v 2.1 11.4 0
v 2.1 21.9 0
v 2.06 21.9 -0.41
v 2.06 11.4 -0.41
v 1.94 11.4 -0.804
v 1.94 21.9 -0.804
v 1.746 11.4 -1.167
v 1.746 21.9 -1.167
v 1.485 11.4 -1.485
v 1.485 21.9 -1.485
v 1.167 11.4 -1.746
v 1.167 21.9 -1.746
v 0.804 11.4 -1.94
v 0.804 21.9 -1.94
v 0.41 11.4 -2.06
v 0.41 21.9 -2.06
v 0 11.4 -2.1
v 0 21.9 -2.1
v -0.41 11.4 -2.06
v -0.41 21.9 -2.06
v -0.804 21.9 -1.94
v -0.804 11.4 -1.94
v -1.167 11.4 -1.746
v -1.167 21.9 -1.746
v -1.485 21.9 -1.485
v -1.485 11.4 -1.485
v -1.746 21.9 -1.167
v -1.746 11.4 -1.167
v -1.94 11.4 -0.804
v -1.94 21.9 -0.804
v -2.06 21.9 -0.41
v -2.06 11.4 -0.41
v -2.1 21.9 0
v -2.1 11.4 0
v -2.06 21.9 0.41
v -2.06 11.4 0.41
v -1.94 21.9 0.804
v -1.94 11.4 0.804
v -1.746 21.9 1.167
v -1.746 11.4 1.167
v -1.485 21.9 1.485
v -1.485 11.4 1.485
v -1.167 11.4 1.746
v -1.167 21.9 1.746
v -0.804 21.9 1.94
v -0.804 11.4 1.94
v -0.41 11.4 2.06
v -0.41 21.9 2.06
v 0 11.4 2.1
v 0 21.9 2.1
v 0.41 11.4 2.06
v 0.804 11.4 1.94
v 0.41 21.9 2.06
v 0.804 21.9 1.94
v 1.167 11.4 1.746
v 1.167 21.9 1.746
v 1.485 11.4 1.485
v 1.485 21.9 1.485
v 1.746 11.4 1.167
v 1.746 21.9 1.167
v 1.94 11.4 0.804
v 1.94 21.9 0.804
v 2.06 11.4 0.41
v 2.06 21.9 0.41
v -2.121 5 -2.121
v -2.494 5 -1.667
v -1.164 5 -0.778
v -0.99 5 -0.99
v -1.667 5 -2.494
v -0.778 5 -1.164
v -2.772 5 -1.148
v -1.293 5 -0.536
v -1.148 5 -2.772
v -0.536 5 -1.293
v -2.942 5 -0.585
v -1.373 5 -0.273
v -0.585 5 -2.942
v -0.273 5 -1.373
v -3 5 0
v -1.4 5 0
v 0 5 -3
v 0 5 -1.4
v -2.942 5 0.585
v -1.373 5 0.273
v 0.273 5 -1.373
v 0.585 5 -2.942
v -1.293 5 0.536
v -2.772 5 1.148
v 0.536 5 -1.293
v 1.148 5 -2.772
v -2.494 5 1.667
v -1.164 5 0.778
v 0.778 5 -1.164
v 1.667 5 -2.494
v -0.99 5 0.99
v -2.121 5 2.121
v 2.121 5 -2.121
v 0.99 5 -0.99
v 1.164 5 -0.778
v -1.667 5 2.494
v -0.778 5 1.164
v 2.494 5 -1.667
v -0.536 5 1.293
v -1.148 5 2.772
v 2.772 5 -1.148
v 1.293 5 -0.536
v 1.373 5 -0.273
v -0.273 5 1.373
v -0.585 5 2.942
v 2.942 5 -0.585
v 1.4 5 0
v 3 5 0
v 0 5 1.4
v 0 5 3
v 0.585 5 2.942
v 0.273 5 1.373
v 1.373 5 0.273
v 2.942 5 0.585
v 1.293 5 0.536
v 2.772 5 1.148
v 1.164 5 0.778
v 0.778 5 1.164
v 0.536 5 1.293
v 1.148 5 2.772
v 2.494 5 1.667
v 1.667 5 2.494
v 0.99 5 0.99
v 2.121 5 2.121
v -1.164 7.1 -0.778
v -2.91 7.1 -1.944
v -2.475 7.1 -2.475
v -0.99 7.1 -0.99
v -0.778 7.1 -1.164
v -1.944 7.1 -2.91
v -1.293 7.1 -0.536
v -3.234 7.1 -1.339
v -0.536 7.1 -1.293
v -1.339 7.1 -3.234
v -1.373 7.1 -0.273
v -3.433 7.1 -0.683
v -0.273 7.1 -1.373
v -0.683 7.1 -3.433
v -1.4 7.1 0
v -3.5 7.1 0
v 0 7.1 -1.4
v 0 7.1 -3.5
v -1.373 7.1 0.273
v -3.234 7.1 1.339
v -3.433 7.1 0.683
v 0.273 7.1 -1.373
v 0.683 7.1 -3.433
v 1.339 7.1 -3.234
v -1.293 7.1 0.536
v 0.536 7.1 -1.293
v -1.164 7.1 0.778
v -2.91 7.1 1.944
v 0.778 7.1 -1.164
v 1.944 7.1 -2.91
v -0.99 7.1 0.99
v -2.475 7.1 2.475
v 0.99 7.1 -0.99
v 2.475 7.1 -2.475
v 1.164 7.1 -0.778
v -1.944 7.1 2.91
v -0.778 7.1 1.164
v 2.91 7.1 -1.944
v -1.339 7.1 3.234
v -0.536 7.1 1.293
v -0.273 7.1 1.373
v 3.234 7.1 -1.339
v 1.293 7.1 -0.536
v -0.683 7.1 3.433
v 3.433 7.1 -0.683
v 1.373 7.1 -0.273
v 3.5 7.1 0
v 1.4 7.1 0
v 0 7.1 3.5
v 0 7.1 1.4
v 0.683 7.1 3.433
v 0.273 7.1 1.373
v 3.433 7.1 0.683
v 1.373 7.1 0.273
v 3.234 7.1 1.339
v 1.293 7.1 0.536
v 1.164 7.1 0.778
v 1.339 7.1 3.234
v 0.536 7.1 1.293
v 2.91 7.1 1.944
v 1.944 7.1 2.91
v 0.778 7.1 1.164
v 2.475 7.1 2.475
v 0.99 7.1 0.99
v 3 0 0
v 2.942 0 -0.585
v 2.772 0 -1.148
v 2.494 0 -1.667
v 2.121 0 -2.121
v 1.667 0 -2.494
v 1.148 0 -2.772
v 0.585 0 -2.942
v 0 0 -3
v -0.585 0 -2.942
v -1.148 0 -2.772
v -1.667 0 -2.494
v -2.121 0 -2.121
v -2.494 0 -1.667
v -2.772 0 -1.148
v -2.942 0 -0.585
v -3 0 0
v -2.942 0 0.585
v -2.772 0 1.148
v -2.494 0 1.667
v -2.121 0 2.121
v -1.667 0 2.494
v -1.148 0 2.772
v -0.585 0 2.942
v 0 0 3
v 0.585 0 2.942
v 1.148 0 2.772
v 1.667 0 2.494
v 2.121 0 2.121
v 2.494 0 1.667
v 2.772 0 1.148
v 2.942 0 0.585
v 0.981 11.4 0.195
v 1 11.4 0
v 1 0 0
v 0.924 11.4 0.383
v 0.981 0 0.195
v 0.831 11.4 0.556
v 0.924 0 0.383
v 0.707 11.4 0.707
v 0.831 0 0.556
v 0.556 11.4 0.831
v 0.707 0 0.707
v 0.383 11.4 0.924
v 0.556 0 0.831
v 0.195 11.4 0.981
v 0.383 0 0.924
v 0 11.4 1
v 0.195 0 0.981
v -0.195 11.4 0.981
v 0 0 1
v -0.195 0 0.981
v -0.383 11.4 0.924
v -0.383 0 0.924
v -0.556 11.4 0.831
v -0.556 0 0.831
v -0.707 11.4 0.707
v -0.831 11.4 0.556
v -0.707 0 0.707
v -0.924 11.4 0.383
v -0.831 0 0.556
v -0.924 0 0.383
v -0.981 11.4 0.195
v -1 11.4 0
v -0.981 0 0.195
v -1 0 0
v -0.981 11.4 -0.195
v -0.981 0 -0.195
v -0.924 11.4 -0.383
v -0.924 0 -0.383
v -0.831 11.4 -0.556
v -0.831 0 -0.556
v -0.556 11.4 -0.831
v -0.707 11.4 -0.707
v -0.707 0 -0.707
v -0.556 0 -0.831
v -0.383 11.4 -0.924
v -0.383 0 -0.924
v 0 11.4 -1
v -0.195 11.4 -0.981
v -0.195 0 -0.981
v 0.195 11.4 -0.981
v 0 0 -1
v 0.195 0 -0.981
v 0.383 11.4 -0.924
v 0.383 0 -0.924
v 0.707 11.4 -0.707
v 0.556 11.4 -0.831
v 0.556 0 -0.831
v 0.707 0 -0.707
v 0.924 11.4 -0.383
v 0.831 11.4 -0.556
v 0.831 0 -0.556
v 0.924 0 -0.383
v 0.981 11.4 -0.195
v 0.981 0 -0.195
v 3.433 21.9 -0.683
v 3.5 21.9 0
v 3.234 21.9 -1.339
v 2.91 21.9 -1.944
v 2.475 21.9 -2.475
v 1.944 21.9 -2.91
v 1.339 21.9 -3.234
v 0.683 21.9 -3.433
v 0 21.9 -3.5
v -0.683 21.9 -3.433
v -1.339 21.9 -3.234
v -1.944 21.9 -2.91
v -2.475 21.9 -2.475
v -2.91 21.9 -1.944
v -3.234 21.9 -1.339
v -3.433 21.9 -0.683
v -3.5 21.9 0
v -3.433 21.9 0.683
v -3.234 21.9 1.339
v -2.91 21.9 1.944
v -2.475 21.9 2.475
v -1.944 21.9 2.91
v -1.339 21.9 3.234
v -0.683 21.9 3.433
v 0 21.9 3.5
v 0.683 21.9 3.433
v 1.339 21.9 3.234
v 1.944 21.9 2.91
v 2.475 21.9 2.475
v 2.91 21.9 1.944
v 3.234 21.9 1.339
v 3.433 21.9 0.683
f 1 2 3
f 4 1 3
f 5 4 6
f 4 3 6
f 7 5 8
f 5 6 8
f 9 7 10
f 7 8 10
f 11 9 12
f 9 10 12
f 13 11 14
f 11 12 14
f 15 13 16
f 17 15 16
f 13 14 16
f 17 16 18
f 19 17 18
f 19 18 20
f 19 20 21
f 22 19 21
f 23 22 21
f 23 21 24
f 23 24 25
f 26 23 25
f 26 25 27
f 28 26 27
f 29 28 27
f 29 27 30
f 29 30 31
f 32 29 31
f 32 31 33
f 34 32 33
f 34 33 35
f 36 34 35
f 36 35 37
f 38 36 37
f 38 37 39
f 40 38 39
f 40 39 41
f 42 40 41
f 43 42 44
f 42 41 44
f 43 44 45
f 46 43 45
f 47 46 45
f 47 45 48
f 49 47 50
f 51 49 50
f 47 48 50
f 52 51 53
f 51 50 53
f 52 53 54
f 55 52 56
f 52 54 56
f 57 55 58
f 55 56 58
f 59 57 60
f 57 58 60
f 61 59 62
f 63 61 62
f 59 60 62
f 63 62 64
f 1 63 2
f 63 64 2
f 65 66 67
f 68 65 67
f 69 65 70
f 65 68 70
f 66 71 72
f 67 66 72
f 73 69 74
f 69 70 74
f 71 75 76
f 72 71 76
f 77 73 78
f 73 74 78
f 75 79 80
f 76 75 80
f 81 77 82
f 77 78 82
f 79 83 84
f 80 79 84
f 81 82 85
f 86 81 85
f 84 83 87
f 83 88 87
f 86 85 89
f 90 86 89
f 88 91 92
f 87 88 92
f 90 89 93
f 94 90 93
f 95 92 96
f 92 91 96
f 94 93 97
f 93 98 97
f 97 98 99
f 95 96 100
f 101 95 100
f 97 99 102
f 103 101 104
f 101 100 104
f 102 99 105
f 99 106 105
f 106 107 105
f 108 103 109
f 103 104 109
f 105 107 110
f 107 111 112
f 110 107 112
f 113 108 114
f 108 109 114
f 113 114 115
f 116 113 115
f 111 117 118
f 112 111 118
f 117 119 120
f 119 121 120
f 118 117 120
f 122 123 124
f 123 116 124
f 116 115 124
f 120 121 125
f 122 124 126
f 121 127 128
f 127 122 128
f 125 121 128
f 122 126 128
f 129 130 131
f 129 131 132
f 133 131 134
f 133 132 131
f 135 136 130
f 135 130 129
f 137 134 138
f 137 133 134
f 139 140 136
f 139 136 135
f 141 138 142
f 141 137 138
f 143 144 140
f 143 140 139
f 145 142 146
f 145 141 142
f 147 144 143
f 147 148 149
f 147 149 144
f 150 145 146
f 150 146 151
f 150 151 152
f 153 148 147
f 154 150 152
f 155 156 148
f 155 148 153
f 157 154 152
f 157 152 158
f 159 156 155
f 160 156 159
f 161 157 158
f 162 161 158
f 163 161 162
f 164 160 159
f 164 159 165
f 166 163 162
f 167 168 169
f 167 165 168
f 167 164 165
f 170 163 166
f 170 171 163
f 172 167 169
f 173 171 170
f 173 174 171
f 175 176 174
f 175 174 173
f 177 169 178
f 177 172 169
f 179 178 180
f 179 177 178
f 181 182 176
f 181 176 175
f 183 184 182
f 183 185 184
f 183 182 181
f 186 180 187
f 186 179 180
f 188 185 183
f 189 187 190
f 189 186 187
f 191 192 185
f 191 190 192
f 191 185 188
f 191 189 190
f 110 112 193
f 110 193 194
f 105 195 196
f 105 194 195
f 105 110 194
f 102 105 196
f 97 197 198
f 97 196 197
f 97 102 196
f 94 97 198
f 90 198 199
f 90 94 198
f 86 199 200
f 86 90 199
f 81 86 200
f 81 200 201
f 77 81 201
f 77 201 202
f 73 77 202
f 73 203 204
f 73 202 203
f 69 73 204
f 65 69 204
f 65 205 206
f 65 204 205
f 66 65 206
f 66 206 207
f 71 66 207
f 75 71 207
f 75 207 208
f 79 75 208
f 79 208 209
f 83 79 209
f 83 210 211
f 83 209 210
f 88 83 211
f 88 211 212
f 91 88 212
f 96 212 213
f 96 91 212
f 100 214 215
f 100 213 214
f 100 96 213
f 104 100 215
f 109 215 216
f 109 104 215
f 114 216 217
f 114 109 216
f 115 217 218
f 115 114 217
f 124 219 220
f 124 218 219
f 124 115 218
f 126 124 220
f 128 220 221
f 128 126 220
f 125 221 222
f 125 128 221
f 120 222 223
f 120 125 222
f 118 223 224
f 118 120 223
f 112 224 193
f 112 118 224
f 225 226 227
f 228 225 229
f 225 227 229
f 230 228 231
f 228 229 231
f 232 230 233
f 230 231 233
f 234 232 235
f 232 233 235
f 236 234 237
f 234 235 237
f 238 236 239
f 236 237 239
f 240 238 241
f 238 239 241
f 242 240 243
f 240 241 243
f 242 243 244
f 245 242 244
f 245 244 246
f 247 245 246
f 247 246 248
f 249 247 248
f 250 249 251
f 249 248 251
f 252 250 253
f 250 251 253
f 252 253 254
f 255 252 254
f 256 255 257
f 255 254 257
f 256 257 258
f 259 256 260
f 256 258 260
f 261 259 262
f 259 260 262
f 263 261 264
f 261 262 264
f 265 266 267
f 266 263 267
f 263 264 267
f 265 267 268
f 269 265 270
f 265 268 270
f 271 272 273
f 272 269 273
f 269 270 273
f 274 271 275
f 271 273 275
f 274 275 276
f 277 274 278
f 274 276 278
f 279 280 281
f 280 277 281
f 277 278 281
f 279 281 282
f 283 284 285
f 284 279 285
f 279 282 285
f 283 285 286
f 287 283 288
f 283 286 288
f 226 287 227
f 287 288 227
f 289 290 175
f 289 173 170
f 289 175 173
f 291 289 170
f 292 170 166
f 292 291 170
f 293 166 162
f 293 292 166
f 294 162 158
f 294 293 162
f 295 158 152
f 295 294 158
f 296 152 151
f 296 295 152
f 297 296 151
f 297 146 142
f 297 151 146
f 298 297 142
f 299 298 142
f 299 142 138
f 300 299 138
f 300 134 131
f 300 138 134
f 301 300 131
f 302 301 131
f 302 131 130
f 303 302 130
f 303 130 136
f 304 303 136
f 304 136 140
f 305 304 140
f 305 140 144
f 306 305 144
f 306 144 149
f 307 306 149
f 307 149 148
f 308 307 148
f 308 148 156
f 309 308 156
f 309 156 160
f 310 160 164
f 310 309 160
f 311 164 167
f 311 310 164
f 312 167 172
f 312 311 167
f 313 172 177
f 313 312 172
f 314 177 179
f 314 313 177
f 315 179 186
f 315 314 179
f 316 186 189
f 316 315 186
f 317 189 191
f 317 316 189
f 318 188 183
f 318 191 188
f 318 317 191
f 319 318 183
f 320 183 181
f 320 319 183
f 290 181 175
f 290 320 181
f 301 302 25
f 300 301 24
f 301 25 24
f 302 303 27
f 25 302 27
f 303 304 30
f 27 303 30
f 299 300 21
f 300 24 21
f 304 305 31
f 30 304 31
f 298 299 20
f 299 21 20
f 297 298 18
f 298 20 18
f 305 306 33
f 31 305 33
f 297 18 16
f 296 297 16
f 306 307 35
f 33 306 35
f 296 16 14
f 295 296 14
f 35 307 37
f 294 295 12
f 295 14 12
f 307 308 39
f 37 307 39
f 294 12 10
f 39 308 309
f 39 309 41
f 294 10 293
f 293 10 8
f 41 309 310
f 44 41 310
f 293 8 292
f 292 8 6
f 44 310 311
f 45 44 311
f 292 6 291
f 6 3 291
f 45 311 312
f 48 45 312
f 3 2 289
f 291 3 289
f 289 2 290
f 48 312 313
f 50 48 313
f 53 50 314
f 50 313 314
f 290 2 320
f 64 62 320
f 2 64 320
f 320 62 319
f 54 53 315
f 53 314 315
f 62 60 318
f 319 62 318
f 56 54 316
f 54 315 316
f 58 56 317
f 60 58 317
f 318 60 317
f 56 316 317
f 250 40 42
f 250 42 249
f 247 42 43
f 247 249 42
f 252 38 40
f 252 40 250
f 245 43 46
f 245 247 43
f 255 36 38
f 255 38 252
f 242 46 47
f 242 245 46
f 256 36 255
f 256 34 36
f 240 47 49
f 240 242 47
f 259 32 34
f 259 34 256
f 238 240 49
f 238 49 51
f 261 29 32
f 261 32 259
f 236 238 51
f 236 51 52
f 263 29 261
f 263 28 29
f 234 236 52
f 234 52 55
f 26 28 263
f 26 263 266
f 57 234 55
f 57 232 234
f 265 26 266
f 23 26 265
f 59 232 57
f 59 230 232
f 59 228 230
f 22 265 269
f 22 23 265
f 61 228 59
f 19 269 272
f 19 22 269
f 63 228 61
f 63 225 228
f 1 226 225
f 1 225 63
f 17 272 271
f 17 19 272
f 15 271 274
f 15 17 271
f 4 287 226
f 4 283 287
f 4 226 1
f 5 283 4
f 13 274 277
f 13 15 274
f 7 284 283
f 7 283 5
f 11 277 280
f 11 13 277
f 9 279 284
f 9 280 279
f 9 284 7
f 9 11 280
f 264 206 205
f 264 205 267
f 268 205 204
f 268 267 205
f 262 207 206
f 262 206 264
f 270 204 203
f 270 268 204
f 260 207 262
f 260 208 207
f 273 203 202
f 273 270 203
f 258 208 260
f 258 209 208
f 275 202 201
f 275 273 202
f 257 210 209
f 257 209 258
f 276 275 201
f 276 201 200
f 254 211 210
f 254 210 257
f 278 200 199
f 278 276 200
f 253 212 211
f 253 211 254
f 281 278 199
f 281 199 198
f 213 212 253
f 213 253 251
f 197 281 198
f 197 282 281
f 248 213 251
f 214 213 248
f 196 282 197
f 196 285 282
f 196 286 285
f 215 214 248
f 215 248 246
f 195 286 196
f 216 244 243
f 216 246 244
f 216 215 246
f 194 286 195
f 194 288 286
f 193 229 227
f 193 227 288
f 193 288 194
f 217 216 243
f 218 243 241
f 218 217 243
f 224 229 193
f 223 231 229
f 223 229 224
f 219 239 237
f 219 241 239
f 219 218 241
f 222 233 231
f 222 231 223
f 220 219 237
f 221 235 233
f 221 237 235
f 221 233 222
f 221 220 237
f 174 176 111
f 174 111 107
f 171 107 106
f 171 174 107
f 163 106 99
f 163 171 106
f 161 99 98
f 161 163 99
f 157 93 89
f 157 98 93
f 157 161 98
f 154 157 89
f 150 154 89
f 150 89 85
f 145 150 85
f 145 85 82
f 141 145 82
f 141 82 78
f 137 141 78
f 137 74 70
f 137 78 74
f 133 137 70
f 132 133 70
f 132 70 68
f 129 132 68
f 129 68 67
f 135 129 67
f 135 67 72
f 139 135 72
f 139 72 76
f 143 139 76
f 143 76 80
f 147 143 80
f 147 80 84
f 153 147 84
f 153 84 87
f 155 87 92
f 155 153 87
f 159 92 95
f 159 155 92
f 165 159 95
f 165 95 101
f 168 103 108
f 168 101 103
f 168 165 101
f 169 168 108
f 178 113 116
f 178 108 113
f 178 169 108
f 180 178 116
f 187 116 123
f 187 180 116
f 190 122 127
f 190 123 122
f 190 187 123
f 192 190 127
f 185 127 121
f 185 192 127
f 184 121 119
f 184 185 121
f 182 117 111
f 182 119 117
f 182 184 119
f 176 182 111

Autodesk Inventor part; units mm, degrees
ref_plane "YZ Plane" through (0, 0, 0) normal (1, 0, 0) x (0, 1, 0)
ref_plane "XZ Plane" through (0, 0, 0) normal (0, 1, 0) x (-1, 0, 0)
ref_plane "XY Plane" through (0, 0, 0) normal (0, 0, 1) x (1, 0, 0)
sketch "Sketch1" plane through (0, 0, 0) normal (0, 0, 1) x (1, 0, 0)
  line L0 (0, 0) -> (3, 0)
  line L1 (3, 0) -> (3, 5)
  line L2 (3, 5) -> (1.4, 5)
  line L3 (1.4, 5) -> (1.4, 7.1)
  line L4 (1.4, 7.1) -> (3.5, 7.1)
  line L5 (3.5, 7.1) -> (3.5, 21.9)
  line L6 (3.5, 21.9) -> (0, 21.9)
  line L7 (0, 21.9) -> (0, 0)
  dimension "d0" = 3
  dimension "d1" = 5
  dimension "d2" = 1.4
  dimension "d3" = 2.1
  dimension "d4" = 3.5
  dimension "d5" = 14.8
revolve "Revolution1" add sketch "Sketch1" angle 360 about axis through (0, 21.9, 0) along (0, -1, 0)
thread "Thread1" size "M6x1" class "6g" standard "ANSI Metric M Profile" full length
thread "Thread2" size "M7x1" class "6g" standard "ANSI Metric M Profile" full length
sketch "Sketch2" plane through (0, 0, 0) normal (0, -1, 0) x (1, 0, 0)
  circle A0 centre (0, 0) radius 3.5 projected
  circle A1 centre (0, 0) radius 1
  dimension "d11" = 2
extrude "Extrusion1" cut sketch "Sketch2" against normal up to surface (21.9 mm away) contours A1
sketch "Sketch3" plane through (0, 21.9, 0) normal (0, 1, 0) x (1, 0, 0)
  circle A0 centre (0, 0) radius 1 projected
  circle A1 centre (0, 0) radius 3.5 projected
  circle A2 centre (0, 0) radius 2.1
  dimension "d14" = 4.2
extrude "Extrusion2" cut sketch "Sketch3" against normal blind 10.5 contours A2
properties part number "E3DV6HeatBreak" material "Stainless Steel"
